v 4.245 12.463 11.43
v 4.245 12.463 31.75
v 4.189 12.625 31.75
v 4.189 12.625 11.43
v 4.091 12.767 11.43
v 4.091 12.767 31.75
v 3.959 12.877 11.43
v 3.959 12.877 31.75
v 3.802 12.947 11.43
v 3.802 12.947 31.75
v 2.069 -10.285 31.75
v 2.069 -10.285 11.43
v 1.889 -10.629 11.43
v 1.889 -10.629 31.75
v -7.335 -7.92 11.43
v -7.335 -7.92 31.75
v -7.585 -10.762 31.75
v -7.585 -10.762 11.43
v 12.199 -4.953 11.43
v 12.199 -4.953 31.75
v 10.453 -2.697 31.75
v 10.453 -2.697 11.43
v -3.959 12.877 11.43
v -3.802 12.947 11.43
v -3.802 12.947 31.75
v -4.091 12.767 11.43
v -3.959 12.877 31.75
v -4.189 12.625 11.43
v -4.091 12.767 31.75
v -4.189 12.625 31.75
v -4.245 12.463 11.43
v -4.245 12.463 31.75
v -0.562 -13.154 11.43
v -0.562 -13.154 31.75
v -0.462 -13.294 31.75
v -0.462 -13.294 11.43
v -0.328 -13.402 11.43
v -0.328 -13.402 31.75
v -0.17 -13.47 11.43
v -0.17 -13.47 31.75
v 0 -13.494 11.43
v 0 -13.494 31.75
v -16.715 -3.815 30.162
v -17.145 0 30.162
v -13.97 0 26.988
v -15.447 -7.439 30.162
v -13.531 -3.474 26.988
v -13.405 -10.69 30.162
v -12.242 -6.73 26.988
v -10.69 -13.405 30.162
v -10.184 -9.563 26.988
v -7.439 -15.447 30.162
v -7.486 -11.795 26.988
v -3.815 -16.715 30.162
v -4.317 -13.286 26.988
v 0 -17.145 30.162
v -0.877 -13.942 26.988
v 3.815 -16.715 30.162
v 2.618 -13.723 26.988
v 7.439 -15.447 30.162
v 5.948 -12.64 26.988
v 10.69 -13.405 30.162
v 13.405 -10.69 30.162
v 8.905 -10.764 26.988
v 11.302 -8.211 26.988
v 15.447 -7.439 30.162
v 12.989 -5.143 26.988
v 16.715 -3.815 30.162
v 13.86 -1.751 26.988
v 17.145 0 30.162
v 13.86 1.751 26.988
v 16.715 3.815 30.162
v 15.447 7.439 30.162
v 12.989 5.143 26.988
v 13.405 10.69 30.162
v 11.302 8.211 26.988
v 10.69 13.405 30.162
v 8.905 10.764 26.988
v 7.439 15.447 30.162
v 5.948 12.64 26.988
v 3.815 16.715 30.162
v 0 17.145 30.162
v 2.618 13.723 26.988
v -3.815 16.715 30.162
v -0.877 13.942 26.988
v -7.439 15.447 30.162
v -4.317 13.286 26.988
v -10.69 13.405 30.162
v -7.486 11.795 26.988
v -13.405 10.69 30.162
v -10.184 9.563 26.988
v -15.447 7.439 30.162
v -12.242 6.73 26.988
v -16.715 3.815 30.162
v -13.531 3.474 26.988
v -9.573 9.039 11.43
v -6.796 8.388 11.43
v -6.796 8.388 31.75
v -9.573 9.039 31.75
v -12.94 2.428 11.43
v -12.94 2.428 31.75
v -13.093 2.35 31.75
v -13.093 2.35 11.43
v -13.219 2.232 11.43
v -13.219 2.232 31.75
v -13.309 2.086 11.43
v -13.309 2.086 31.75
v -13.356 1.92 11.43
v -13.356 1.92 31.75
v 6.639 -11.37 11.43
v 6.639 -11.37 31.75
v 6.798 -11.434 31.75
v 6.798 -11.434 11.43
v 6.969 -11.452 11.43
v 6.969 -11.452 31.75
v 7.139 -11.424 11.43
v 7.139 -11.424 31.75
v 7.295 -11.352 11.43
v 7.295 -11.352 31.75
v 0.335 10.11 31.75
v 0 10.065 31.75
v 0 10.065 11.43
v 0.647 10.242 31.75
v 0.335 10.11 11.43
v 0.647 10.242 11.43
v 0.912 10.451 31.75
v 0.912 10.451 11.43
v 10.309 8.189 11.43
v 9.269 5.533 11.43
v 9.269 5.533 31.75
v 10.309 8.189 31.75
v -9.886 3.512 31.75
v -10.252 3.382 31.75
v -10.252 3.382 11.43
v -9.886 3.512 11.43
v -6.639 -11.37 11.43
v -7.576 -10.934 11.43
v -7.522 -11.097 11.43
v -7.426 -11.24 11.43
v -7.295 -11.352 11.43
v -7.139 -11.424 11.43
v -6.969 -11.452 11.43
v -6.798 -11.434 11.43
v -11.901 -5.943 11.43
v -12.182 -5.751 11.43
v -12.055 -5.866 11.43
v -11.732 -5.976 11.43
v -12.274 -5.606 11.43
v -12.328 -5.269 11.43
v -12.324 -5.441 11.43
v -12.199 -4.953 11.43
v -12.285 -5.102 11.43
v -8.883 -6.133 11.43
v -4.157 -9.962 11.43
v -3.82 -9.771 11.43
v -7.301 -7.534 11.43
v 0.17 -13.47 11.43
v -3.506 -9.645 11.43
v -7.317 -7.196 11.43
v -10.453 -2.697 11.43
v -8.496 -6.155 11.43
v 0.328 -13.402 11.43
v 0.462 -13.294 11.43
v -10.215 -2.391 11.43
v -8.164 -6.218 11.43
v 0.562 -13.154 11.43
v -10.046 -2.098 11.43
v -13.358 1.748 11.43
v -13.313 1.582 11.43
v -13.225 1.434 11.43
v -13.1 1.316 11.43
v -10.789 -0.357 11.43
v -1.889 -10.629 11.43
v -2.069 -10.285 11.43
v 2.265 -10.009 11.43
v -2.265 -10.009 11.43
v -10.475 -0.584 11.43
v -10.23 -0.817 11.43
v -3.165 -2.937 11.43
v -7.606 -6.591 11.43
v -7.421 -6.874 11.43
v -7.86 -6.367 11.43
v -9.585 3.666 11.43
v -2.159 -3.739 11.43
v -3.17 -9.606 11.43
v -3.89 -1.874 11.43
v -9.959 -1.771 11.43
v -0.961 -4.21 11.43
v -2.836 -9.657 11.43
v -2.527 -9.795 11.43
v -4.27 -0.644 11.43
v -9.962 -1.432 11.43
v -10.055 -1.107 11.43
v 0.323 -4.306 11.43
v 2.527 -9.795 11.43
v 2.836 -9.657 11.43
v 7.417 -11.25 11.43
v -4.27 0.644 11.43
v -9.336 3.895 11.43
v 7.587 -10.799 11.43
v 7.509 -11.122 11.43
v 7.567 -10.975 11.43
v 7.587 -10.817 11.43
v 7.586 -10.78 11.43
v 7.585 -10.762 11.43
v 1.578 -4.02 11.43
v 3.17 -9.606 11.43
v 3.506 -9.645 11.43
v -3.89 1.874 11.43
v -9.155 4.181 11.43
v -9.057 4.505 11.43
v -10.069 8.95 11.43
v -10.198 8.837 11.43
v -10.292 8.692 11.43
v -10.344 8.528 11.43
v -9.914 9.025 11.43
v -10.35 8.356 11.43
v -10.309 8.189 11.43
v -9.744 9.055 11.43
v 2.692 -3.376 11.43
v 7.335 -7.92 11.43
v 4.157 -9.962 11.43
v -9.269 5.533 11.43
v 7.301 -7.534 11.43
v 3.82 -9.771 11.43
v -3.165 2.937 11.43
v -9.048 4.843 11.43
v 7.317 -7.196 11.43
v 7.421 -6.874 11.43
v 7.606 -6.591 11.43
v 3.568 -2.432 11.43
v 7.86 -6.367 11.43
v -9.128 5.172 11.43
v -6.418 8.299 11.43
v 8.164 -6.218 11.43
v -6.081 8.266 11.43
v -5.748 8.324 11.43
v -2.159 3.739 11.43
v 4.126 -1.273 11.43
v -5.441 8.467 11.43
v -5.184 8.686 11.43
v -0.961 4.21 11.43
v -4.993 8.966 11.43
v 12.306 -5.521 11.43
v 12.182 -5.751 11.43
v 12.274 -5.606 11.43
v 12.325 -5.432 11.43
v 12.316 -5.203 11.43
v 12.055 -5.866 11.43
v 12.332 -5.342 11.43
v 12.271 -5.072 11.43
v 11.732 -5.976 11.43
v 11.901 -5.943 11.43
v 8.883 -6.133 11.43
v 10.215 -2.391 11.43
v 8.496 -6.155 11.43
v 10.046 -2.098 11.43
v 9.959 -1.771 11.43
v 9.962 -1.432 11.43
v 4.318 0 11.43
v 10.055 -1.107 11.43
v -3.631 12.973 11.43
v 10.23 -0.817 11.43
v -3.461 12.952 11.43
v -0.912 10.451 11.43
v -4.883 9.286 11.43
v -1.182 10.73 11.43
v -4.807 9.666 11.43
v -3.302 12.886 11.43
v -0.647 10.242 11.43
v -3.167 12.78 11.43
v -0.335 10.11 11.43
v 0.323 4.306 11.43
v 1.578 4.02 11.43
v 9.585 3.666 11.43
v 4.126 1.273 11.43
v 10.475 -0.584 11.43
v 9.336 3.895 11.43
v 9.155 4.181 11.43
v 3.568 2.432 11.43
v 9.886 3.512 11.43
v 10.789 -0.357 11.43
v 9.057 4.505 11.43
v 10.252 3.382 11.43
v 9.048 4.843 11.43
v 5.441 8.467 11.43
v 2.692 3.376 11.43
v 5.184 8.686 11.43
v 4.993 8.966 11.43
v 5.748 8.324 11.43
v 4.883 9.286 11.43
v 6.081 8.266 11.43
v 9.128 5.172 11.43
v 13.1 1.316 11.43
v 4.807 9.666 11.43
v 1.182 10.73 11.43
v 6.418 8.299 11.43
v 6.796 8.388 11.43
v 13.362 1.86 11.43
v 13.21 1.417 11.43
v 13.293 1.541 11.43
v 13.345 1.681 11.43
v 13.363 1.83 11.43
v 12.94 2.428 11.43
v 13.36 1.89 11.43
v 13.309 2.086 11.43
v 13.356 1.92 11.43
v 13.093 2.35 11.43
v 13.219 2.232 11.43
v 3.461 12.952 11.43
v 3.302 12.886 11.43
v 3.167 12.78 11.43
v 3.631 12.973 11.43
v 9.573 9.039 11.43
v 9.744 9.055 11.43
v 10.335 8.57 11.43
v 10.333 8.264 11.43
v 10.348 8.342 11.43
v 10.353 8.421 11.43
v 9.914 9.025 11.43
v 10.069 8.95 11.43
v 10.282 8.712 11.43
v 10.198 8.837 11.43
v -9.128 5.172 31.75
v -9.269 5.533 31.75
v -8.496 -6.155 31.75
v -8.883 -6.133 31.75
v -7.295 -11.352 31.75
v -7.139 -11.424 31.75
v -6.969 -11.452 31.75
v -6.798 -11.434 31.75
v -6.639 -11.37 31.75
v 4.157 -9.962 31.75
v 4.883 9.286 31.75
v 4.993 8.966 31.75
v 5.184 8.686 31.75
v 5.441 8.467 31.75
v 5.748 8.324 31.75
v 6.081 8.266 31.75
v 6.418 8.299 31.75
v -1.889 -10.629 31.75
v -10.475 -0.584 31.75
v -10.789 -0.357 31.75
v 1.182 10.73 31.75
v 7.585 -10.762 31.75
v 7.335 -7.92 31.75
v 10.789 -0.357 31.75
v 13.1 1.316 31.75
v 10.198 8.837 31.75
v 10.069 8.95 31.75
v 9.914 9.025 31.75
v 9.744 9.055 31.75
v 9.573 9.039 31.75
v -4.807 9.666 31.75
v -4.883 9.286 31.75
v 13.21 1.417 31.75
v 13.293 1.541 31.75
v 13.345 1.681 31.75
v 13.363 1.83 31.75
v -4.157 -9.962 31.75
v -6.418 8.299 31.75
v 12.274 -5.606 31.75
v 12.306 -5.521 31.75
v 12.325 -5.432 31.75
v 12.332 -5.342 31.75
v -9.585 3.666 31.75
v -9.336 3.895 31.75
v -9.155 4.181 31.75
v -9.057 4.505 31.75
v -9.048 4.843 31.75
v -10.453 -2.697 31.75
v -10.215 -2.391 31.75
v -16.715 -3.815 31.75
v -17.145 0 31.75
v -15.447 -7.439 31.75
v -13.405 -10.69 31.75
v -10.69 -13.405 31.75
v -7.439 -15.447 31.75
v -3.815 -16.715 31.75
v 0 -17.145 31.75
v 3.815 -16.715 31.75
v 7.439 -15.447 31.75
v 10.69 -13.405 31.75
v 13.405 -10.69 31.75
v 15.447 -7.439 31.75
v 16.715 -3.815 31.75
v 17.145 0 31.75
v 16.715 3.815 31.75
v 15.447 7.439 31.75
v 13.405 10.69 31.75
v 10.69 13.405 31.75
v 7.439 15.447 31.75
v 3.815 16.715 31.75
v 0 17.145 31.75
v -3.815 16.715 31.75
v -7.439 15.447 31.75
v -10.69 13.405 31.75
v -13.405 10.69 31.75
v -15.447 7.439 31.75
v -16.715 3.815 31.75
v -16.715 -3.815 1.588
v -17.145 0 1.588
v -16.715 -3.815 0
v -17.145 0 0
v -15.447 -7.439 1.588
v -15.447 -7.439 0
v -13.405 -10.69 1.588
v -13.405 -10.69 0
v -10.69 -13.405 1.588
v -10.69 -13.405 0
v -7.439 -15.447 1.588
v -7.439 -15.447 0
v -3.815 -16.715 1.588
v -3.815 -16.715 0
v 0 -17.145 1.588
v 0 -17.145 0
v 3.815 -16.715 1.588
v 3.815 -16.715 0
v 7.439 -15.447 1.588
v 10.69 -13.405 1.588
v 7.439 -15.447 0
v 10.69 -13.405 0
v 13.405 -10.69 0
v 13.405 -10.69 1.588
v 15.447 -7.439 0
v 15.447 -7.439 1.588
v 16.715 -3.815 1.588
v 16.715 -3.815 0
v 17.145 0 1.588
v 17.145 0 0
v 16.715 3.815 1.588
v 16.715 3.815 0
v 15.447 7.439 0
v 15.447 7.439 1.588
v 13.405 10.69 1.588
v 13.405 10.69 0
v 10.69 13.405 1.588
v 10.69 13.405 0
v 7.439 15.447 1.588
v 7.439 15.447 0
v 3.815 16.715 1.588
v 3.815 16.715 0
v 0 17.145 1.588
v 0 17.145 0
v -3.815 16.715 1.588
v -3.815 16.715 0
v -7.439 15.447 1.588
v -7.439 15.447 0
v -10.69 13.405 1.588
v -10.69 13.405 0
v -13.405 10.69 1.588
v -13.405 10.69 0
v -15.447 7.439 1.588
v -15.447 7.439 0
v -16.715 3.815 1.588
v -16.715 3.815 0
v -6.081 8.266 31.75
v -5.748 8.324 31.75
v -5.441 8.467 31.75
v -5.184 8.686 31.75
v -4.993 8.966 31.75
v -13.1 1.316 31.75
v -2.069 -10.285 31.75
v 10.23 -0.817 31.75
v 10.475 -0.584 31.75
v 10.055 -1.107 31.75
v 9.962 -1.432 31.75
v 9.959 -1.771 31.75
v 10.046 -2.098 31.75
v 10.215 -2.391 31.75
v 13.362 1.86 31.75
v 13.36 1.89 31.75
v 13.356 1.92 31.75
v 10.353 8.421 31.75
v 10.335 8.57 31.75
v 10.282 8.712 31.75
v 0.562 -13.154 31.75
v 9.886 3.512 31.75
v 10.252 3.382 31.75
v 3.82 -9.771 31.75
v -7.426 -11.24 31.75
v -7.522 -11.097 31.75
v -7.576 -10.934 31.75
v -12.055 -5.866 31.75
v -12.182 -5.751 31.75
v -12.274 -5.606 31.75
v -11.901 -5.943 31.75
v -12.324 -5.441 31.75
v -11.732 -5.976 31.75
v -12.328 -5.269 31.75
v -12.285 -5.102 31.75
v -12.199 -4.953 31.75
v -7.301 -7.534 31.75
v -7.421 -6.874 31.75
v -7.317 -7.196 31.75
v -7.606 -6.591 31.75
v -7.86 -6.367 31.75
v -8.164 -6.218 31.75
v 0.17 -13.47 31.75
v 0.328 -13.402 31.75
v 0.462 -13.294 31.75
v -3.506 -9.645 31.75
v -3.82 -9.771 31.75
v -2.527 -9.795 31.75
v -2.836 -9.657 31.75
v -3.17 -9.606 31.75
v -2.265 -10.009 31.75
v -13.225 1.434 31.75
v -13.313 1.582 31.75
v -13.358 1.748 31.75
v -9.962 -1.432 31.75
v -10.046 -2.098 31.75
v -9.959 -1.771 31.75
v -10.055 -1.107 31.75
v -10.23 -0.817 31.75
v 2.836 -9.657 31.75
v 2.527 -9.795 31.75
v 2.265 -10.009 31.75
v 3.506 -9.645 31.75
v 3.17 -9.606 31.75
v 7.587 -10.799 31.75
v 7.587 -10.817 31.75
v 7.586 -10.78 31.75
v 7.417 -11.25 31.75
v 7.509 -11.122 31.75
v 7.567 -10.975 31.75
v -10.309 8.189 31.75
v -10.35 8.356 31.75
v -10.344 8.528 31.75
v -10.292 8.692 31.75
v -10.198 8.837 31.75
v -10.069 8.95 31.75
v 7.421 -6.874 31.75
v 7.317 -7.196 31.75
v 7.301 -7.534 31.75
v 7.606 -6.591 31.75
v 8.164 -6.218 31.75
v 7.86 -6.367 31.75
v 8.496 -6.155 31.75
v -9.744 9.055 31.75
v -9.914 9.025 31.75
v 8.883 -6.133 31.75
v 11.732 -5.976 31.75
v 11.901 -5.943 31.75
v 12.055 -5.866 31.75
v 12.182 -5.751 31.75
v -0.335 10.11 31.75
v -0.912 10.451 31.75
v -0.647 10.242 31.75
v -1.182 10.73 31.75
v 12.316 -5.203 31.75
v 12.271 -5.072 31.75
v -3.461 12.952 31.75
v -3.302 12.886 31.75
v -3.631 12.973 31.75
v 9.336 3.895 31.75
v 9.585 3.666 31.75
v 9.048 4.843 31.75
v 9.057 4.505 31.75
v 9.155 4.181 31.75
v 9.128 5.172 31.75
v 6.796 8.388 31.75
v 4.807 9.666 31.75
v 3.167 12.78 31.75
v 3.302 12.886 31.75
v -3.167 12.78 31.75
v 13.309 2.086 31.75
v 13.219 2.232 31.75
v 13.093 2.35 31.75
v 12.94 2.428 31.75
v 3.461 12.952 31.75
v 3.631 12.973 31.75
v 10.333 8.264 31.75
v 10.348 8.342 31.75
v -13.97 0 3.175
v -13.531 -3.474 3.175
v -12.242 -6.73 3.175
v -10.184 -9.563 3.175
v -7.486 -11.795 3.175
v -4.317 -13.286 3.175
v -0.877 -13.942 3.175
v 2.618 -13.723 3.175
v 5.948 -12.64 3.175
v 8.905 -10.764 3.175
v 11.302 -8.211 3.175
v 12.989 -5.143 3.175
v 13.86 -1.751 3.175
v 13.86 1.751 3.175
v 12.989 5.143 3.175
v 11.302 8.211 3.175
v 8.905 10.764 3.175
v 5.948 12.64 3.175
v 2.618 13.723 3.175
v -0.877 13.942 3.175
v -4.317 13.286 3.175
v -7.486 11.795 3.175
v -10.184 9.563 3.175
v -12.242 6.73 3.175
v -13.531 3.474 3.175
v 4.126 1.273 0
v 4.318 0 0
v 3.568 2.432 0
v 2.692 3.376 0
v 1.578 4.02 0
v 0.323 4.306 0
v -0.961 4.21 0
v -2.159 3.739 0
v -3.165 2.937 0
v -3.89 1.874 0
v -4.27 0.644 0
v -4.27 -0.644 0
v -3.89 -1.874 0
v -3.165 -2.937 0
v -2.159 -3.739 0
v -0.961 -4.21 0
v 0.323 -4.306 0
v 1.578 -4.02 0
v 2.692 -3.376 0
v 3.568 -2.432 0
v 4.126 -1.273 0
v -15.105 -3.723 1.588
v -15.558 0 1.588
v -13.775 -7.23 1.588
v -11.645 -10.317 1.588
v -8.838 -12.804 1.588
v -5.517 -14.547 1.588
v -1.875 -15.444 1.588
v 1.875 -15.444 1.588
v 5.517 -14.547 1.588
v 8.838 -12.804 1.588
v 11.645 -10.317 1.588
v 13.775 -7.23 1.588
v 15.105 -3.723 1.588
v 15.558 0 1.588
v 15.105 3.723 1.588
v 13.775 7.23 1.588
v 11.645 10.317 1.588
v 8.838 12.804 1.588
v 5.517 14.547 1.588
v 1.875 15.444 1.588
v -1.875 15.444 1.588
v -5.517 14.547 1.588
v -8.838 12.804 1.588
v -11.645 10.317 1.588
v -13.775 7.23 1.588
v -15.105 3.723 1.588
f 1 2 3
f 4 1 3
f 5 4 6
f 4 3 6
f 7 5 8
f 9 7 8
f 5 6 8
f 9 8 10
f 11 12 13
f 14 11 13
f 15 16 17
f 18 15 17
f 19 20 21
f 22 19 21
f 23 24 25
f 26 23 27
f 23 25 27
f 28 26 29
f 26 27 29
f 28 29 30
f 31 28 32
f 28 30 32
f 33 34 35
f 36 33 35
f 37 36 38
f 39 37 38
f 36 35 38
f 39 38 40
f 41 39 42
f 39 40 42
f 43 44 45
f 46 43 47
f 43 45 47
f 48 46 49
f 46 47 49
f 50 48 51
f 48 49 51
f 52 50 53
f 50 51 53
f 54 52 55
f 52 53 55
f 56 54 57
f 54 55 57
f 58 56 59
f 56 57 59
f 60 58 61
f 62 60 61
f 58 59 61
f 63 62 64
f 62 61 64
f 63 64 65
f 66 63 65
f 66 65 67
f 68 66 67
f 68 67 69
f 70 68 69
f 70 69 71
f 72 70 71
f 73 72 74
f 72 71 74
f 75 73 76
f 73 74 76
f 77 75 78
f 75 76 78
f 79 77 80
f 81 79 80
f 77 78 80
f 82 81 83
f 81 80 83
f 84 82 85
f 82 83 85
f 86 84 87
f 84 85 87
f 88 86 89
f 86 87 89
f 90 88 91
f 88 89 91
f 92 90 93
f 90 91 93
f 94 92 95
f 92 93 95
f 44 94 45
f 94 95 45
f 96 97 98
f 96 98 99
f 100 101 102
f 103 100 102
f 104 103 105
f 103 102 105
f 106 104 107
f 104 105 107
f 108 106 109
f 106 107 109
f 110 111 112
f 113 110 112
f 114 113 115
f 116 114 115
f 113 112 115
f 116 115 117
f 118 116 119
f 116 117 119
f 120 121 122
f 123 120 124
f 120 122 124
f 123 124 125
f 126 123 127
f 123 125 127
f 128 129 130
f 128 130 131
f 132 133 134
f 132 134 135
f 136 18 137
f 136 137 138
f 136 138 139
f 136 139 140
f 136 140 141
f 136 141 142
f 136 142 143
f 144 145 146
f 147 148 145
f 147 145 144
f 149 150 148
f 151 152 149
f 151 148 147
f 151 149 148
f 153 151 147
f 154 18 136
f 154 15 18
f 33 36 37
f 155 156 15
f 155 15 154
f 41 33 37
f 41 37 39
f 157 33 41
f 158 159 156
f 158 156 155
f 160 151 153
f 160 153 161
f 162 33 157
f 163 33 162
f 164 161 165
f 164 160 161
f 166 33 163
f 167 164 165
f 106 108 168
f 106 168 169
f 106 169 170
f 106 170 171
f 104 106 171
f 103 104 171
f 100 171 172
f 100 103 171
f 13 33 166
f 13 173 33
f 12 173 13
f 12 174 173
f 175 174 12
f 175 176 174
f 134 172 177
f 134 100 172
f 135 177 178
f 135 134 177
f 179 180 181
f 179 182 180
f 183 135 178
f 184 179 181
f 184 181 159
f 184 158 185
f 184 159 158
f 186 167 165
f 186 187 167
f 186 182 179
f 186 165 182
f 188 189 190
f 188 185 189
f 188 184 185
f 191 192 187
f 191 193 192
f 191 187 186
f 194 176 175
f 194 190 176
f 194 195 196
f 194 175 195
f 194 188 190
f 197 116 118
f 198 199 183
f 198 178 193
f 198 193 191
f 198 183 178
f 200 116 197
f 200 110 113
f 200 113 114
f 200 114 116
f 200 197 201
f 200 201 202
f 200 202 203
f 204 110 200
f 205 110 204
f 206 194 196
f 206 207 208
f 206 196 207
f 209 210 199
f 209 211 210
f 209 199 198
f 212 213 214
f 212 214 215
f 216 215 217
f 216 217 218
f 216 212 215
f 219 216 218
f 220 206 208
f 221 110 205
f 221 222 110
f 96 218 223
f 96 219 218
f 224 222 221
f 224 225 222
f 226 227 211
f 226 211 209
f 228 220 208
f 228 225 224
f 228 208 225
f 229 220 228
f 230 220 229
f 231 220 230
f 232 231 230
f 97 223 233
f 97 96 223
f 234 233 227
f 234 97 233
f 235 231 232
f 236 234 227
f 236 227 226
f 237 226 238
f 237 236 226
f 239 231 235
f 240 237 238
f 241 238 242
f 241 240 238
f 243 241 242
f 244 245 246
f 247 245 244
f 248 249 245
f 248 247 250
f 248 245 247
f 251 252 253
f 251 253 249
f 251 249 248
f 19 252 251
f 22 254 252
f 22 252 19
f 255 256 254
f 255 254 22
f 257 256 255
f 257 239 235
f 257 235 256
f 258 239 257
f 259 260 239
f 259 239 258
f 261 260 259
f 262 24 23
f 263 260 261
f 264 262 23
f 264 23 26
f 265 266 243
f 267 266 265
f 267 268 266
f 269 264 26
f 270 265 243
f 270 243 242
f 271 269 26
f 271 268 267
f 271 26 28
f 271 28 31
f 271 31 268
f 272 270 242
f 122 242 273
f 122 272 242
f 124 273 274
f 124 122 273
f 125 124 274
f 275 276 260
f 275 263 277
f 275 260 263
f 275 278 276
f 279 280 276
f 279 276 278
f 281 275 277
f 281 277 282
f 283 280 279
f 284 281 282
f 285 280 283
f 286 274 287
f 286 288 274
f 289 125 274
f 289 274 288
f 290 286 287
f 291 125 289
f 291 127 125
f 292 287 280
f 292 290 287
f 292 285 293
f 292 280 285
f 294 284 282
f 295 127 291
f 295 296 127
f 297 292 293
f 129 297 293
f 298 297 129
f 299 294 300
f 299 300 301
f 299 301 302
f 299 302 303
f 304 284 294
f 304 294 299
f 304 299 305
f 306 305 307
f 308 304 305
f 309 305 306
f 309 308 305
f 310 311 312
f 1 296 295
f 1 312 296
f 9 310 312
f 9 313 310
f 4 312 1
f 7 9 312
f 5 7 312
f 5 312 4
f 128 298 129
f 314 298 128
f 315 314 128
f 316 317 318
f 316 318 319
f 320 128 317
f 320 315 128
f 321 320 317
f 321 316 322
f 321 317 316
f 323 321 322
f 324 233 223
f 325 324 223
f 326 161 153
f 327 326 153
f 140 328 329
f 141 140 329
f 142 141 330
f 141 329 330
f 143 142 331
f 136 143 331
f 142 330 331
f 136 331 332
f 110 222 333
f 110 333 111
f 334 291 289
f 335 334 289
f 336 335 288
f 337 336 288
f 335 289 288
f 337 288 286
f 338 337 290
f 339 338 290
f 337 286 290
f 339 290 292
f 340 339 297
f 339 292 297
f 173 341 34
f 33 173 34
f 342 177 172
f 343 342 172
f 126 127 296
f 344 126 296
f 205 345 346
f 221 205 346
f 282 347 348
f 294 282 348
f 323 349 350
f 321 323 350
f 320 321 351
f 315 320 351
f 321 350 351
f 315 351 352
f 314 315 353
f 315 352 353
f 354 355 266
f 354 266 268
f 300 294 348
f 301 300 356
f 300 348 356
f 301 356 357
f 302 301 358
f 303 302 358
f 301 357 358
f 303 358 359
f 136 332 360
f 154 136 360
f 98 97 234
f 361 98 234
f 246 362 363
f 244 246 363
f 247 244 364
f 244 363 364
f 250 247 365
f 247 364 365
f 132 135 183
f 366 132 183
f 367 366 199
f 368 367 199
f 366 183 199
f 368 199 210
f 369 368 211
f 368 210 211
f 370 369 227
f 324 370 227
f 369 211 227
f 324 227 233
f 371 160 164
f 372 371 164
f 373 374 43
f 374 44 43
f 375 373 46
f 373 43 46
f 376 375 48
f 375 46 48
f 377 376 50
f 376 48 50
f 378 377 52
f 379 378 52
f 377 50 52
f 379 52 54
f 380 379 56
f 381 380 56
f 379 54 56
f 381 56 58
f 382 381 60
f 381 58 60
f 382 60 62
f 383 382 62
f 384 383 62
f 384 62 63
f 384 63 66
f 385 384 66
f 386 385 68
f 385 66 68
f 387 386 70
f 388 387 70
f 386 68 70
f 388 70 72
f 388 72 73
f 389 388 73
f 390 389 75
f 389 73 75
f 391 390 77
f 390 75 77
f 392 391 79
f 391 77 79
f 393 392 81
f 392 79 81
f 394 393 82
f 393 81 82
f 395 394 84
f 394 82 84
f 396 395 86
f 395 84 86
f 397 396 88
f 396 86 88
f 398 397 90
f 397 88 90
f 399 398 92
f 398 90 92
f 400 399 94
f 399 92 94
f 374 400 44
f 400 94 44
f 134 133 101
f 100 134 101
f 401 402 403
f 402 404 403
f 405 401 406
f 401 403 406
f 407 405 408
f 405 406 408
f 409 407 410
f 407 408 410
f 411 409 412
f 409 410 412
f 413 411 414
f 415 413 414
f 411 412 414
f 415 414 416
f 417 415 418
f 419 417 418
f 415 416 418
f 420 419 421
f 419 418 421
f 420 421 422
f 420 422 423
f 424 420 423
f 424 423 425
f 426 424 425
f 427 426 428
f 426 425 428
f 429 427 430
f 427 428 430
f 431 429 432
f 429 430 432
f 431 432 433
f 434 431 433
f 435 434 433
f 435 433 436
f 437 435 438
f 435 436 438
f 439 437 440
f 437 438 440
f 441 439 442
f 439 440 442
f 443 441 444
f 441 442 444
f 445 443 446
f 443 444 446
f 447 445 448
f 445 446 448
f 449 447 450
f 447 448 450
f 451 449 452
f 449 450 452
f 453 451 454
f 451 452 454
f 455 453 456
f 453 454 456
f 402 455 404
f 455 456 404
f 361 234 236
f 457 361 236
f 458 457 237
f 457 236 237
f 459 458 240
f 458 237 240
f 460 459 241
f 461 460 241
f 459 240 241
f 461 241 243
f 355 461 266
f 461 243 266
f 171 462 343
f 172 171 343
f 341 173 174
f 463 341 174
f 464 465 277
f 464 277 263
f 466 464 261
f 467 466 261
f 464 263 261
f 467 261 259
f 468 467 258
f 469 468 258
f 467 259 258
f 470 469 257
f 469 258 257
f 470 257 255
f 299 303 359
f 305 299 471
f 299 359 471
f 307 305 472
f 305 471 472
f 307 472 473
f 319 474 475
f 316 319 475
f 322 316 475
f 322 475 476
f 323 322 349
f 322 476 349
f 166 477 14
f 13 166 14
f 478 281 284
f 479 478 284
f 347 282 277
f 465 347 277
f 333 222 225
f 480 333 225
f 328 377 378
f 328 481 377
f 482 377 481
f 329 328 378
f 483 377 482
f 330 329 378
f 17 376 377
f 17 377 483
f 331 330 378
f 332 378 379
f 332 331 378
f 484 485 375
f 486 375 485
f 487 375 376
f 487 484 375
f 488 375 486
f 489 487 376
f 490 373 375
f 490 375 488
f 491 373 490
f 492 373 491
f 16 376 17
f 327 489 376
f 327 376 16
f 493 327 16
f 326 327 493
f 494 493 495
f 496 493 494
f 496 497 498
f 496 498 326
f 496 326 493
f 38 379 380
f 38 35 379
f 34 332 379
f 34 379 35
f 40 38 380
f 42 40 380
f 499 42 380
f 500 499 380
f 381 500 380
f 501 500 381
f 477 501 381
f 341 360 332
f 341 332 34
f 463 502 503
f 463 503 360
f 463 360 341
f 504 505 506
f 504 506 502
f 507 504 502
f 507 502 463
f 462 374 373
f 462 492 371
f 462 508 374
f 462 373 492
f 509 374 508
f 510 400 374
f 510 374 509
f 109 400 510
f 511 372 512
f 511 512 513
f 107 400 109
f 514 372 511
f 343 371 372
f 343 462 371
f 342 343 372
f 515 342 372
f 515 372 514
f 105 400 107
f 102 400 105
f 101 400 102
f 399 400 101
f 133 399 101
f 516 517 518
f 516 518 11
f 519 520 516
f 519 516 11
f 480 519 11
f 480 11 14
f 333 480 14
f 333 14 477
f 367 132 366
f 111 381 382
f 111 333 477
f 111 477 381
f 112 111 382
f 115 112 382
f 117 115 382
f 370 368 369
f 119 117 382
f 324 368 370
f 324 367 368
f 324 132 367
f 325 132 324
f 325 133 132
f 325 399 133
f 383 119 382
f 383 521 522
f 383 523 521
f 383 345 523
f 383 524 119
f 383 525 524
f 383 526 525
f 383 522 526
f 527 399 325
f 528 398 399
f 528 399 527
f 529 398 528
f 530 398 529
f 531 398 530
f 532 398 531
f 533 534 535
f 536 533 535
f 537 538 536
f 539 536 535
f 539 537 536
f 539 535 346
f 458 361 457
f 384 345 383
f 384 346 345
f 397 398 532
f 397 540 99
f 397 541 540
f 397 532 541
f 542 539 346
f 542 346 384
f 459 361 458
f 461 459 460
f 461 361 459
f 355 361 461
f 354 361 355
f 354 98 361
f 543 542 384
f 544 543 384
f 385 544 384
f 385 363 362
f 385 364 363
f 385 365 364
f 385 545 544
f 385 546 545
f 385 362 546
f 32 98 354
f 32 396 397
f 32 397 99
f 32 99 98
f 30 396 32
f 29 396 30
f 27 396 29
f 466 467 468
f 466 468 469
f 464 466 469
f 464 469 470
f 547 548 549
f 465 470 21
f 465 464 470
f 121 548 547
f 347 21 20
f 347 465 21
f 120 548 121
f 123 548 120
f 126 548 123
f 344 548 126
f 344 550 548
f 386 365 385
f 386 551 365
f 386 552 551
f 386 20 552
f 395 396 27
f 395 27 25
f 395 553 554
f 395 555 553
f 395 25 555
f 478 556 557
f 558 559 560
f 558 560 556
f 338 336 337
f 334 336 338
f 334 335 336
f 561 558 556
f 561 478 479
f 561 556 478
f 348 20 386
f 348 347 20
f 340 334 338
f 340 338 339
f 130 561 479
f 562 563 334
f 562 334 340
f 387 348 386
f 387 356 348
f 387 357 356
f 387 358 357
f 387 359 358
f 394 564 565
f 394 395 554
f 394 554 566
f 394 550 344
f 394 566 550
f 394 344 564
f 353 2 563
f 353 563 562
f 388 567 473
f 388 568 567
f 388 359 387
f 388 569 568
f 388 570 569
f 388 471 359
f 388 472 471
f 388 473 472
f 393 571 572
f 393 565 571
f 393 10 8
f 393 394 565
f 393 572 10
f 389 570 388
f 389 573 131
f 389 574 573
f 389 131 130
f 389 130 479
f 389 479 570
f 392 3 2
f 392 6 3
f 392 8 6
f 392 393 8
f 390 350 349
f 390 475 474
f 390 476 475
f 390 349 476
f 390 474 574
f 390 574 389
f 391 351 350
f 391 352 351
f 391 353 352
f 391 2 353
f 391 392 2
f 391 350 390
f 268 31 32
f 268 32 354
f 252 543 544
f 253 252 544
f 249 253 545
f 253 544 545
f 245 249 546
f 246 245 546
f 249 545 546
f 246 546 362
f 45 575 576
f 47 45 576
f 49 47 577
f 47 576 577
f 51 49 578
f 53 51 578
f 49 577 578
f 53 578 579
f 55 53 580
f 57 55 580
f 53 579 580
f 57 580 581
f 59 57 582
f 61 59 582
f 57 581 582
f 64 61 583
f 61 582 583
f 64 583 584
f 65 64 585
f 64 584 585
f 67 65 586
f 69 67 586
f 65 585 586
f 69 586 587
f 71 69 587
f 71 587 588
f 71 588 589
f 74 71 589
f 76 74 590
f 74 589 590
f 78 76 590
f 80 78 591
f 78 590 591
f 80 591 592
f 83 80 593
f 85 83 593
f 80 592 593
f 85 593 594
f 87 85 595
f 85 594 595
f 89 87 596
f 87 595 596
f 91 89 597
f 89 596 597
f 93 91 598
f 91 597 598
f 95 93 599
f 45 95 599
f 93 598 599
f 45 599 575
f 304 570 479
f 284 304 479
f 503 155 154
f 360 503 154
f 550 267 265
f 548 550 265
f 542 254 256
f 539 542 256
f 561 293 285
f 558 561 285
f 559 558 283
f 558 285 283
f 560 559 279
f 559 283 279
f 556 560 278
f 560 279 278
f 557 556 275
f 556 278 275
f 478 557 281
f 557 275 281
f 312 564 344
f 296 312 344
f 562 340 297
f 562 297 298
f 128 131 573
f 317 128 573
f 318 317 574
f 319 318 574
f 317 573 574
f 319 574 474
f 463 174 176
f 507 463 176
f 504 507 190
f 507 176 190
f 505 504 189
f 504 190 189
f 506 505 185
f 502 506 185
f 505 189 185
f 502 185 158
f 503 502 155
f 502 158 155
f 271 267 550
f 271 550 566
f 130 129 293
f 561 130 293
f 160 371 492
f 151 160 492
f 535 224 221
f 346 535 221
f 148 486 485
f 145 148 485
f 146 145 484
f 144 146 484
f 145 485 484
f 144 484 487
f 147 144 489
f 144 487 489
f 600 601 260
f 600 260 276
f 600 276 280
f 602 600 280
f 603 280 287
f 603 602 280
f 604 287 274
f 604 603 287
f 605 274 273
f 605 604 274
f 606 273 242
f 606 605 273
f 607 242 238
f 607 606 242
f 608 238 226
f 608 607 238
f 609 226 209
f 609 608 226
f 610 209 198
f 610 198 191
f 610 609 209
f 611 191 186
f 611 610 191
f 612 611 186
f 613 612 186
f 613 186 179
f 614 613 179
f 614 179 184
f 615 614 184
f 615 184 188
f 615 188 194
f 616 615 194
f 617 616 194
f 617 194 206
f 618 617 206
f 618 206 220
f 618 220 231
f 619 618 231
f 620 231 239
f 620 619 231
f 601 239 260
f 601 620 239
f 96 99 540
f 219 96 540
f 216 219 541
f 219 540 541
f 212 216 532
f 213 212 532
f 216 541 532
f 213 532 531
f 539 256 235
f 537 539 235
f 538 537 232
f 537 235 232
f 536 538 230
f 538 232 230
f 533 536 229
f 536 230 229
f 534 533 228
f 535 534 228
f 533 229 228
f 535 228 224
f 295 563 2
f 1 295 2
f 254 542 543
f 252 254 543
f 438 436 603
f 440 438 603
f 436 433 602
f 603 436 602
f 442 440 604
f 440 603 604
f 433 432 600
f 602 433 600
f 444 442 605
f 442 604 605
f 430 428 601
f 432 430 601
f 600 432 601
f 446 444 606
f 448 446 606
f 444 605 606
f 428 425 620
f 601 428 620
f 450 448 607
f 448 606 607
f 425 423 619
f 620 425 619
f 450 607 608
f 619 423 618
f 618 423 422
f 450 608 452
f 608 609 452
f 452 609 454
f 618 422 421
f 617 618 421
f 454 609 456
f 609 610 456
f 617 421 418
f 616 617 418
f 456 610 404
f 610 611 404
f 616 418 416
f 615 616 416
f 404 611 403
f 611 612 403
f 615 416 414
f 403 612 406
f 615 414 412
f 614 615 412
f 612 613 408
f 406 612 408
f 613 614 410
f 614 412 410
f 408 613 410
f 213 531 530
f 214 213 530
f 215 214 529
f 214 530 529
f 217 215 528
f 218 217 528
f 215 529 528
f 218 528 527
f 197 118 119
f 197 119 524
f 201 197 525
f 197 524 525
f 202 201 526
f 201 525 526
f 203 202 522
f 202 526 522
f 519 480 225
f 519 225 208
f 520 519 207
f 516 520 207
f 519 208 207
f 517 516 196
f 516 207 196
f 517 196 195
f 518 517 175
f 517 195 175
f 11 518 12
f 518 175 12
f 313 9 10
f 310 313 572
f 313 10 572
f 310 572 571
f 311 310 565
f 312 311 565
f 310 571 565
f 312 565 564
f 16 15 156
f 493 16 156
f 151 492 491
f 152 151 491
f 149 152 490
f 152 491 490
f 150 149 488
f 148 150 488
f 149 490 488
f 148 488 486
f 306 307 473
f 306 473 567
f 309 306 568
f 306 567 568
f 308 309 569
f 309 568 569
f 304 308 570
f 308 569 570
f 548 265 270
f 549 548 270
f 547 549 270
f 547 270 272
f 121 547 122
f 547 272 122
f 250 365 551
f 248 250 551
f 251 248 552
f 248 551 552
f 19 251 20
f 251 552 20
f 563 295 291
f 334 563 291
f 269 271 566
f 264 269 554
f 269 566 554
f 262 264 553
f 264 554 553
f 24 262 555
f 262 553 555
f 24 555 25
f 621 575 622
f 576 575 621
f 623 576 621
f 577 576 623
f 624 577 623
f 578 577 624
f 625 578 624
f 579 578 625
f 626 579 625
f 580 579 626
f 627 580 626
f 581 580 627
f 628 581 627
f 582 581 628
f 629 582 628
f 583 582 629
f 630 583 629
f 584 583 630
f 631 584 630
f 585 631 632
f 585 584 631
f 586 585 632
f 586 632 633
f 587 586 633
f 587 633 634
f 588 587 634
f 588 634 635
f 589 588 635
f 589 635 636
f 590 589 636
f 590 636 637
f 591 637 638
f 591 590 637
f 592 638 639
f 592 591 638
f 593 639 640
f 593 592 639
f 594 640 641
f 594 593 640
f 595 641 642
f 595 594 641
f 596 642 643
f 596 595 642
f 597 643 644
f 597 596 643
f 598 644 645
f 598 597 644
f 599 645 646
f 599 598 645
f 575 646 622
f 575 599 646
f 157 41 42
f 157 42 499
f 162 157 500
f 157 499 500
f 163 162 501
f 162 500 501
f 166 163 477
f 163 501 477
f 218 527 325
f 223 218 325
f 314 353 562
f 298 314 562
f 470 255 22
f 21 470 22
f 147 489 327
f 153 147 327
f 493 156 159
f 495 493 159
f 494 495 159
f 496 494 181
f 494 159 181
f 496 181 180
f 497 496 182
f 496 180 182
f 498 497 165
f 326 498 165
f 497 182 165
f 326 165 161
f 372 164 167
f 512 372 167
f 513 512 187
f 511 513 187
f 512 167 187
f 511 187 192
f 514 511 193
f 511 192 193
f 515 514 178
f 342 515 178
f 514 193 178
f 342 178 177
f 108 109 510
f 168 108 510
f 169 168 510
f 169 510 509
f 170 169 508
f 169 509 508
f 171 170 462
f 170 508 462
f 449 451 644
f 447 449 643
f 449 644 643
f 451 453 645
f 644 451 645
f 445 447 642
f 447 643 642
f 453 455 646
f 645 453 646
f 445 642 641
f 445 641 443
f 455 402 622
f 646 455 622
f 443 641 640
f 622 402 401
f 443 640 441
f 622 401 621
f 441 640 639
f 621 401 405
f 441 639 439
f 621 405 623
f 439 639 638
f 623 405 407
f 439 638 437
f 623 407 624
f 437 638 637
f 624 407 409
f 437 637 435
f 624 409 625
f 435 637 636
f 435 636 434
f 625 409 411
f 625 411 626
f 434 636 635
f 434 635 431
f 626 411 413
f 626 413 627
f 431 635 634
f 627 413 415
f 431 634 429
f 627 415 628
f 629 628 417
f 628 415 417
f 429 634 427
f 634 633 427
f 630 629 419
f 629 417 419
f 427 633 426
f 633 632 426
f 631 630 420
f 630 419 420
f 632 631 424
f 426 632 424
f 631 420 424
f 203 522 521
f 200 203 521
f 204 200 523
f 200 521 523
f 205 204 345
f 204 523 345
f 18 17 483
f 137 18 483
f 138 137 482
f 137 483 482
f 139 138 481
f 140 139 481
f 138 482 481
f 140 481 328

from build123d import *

# Parameters (mm, degrees)
F0_R     = 12.7
F0_R_2   = 4.318
F1_DEPTH = 11.43
F5_SIZE  = 1.5875
F7_DEPTH = 20.32
F8_DEPTH = 20.32


with BuildPart() as f1:
    # F0 (on Top) → F1 (new body)
    with BuildSketch(Plane.XY):
        Circle(F0_R)
        Circle(F0_R_2, mode=Mode.SUBTRACT)
    extrude(amount=F1_DEPTH)

    # F2 (on Front) → F3 (revolve)
    with BuildSketch(Plane.XZ):
        Polygon((-17.145, 0), (-7.62, 0), (-7.62, 1.5875), (-10.795, 1.5875), (-10.795, 31.75), (-17.145, 31.75), (-17.145, 30.1625), (-13.97, 30.1625), (-13.97, 26.9875), (-13.97, 1.5875), (-17.145, 1.5875), align=None)
        Polygon((-17.145, 30.1625), (-13.97, 26.9875), (-13.97, 30.1625), align=None)
    revolve(axis=Axis((0, 0, 11.5776285529), (0, 0, 1)))

    # F5
    f5_edges = [f1.edges().sort_by_distance(p)[0] for p in [
        (13.97, 0, 1.5875),
    ]]
    chamfer(f5_edges, length=F5_SIZE)

    # F6 (on face) → F7 (cut, through all)
    with BuildSketch(Plane.XY.offset(31.75)):
        with BuildLine():
            Line((-10.4525954137, -2.6972716061), (-12.1988524903, -4.9530041056))
            ThreePointArc((-12.1988524903, -4.9530041056), (-11.4913314283, -4.7408549365), (-11.0617303864, -5.3417178727))
            ThreePointArc((-11.0617303864, -5.3417178727), (-11.2602854276, -5.8029562036), (-11.7317801436, -5.9757498234))
            Line((-11.7317801436, -5.9757498234), (-8.8834561601, -6.1332072892))
            ThreePointArc((-8.8834561601, -6.1332072892), (-9.8194773853, -4.4844050753), (-10.4525954137, -2.6972716061))
        make_face()
        with BuildLine():
            ThreePointArc((-12.1988524903, -4.9530041056), (-12.3275224072, -5.2687355018), (-12.2743467257, -5.605506357))
            ThreePointArc((-12.2743467257, -5.605506357), (-12.0546549491, -5.8662319406), (-11.7317801436, -5.9757498234))
            ThreePointArc((-11.7317801436, -5.9757498234), (-11.2602854276, -5.8029562036), (-11.0617303864, -5.3417178727))
            ThreePointArc((-11.0617303864, -5.3417178727), (-11.4913314283, -4.7408549365), (-12.1988524903, -4.9530041056))
        make_face()
        with BuildLine():
            Line((-10.2515379451, 3.3820104613), (-12.9401239425, 2.4284653804))
            ThreePointArc((-12.9401239425, 2.4284653804), (-12.361504969, 2.3486470375), (-12.0928664774, 1.8299908459))
            ThreePointArc((-12.0928664774, 1.8299908459), (-12.4390464603, 1.264475154), (-13.1001357616, 1.3155585568))
            Line((-13.1001357616, 1.3155585568), (-10.7891010809, -0.3568232994))
            ThreePointArc((-10.7891010809, -0.3568232994), (-10.6851224667, 1.5362886683), (-10.2515379451, 3.3820104613))
        make_face()
        with BuildLine():
            ThreePointArc((-12.9401239425, 2.4284653804), (-13.2190652412, 2.2324194413), (-13.3564030838, 1.9203608324))
            ThreePointArc((-13.3564030838, 1.9203608324), (-13.3125454969, 1.5822501665), (-13.1001357616, 1.3155585568))
            ThreePointArc((-13.1001357616, 1.3155585568), (-12.4390464603, 1.264475154), (-12.0928664774, 1.8299908459))
            ThreePointArc((-12.0928664774, 1.8299908459), (-12.361504969, 2.3486470375), (-12.9401239425, 2.4284653804))
        make_face()
        with BuildLine():
            Line((-6.7956896128, 8.3875281035), (-9.5729974735, 9.0389142669))
            ThreePointArc((-9.5729974735, 9.0389142669), (-9.2203512646, 8.8151214081), (-9.0829948927, 8.4206904009))
            ThreePointArc((-9.0829948927, 8.4206904009), (-9.6001982975, 7.7967120663), (-10.3092908365, 8.1891863905))
            Line((-10.3092908365, 8.1891863905), (-9.2692826406, 5.5328495668))
            ThreePointArc((-9.2692826406, 5.5328495668), (-8.1583166623, 7.0692216147), (-6.7956896128, 8.3875281035))
        make_face()
        with BuildLine():
            ThreePointArc((-9.5729974735, 9.0389142669), (-9.9136482865, 9.0247969722), (-10.1978958619, 8.8365269791))
            ThreePointArc((-10.1978958619, 8.8365269791), (-10.3437969109, 8.5283789982), (-10.3092908365, 8.1891863905))
            ThreePointArc((-10.3092908365, 8.1891863905), (-9.6001982975, 7.7967120663), (-9.0829948927, 8.4206904009))
            ThreePointArc((-9.0829948927, 8.4206904009), (-9.2203512646, 8.8151214081), (-9.5729974735, 9.0389142669))
        make_face()
        with BuildLine():
            Line((-1.1822578445, 10.7300648362), (-3.1665119462, 12.7795717395))
            ThreePointArc((-3.1665119462, 12.7795717395), (-3.0341189729, 12.5761316197), (-2.9877285936, 12.3378802515))
            ThreePointArc((-2.9877285936, 12.3378802515), (-3.6854985998, 11.7059902877), (-4.2453189127, 12.4628054073))
            Line((-4.2453189127, 12.4628054073), (-4.8065324556, 9.6658817887))
            ThreePointArc((-4.8065324556, 9.6658817887), (-3.0413029616, 10.3577266471), (-1.1822578445, 10.7300648362))
        make_face()
        with BuildLine():
            ThreePointArc((-3.1665119462, 12.7795717395), (-3.4607180661, 12.9518652586), (-3.8016288198, 12.9471582743))
            ThreePointArc((-3.8016288198, 12.9471582743), (-4.090965925, 12.7668077529), (-4.2453189127, 12.4628054073))
            ThreePointArc((-4.2453189127, 12.4628054073), (-3.6854985998, 11.7059902877), (-2.9877285936, 12.3378802515))
            ThreePointArc((-2.9877285936, 12.3378802515), (-3.0341189729, 12.5761316197), (-3.1665119462, 12.7795717395))
        make_face()
        with BuildLine():
            Line((3.0413028854, 10.3577266695), (3.4438282673, 11.7286022581))
            ThreePointArc((3.4438282673, 11.7286022581), (3.008743441, 12.1758697278), (3.1665117699, 12.7795717652))
            Line((3.1665117699, 12.7795717652), (1.1822578227, 10.7300648386))
            ThreePointArc((1.1822578227, 10.7300648386), (2.1199705639, 10.5847886048), (3.0413028854, 10.3577266695))
        make_face()
        with BuildLine():
            ThreePointArc((4.2453187505, 12.462805481), (4.0909657389, 12.766807831), (3.8016286067, 12.9471583368))
            Line((3.8016286067, 12.9471583368), (3.4438282673, 11.7286022581))
            ThreePointArc((3.4438282673, 11.7286022581), (4.0032697568, 11.8295366107), (4.257728437, 12.3378802975))
            ThreePointArc((4.257728437, 12.3378802975), (4.2546183994, 12.4006503178), (4.2453187505, 12.462805481))
        make_face()
        with BuildLine():
            ThreePointArc((4.257728437, 12.3378802975), (4.0032697568, 11.8295366107), (3.4438282673, 11.7286022581))
            Line((3.4438282673, 11.7286022581), (3.0413028854, 10.3577266695))
            ThreePointArc((3.0413028854, 10.3577266695), (3.9391359635, 10.0506334557), (4.806532436, 9.6658817985))
            Line((4.806532436, 9.6658817985), (4.2453187505, 12.462805481))
            ThreePointArc((4.2453187505, 12.462805481), (4.2546183994, 12.4006503178), (4.257728437, 12.3378802975))
        make_face()
        with BuildLine():
            Line((3.4438282673, 11.7286022581), (3.8016286067, 12.9471583368))
            ThreePointArc((3.8016286067, 12.9471583368), (3.4607178673, 12.9518652935), (3.1665117699, 12.7795717652))
            ThreePointArc((3.1665117699, 12.7795717652), (3.008743441, 12.1758697278), (3.4438282673, 11.7286022581))
        make_face()
        with BuildLine():
            Line((-7.335027693, -7.9201889967), (-7.5845315655, -10.7619297844))
            ThreePointArc((-7.5845315655, -10.7619297844), (-6.924168837, -10.1830775705), (-6.3169650428, -10.8174689094))
            ThreePointArc((-6.3169650428, -10.8174689094), (-6.4032533172, -11.1370630929), (-6.6386672228, -11.3697998573))
            Line((-6.6386672228, -11.3697998573), (-4.157376676, -9.9623412998))
            ThreePointArc((-4.157376676, -9.9623412998), (-5.8362176152, -9.0813318928), (-7.335027693, -7.9201889967))
        make_face()
        with BuildLine():
            ThreePointArc((-7.5845315655, -10.7619297844), (-7.52207831, -11.0971041407), (-7.2952720168, -11.3516648675))
            ThreePointArc((-7.2952720168, -11.3516648675), (-6.969496637, -11.4522268501), (-6.6386672228, -11.3697998573))
            ThreePointArc((-6.6386672228, -11.3697998573), (-6.4032533172, -11.1370630929), (-6.3169650428, -10.8174689094))
            ThreePointArc((-6.3169650428, -10.8174689094), (-6.924168837, -10.1830775705), (-7.5845315655, -10.7619297844))
        make_face()
        with BuildLine():
            Line((-1.8886405066, -10.6285023421), (-0.5621754583, -13.1540187967))
            ThreePointArc((-0.5621754583, -13.1540187967), (-0.1520583482, -12.2422248716), (0.6350000816, -12.85875))
            ThreePointArc((0.6350000816, -12.85875), (0.6165252134, -13.0108084161), (0.5621756347, -13.1540187717))
            Line((0.5621756347, -13.1540187717), (1.8886405281, -10.6285023383))
            ThreePointArc((1.8886405281, -10.6285023383), (1.09e-08, -10.795), (-1.8886405066, -10.6285023421))
        make_face()
        with BuildLine():
            ThreePointArc((-0.5621754583, -13.1540187967), (-0.3284274706, -13.4022206459), (8.16e-08, -13.49375))
            ThreePointArc((8.16e-08, -13.49375), (0.3284276459, -13.4022206386), (0.5621756347, -13.1540187717))
            ThreePointArc((0.5621756347, -13.1540187717), (0.6165252134, -13.0108084161), (0.6350000816, -12.85875))
            ThreePointArc((0.6350000816, -12.85875), (-0.1520583482, -12.2422248716), (-0.5621754583, -13.1540187967))
        make_face()
        with BuildLine():
            Line((4.1573766962, -9.9623412914), (6.6386673847, -11.369799783))
            ThreePointArc((6.6386673847, -11.369799783), (6.6086582491, -10.2832728355), (7.5845317003, -10.7619296679))
            Line((7.5845317003, -10.7619296679), (7.3350277091, -7.9201889818))
            ThreePointArc((7.3350277091, -7.9201889818), (5.8362176336, -9.081331881), (4.1573766962, -9.9623412914))
        make_face()
        with BuildLine():
            ThreePointArc((6.6386673847, -11.369799783), (6.9694967855, -11.4522267615), (7.2952721492, -11.3516647824))
            ThreePointArc((7.2952721492, -11.3516647824), (7.5092913527, -11.1217919017), (7.5869651801, -10.8174688212))
            ThreePointArc((7.5869651801, -10.8174688212), (7.5863565184, -10.7896726012), (7.5845317003, -10.7619296679))
            ThreePointArc((7.5845317003, -10.7619296679), (6.6086582491, -10.2832728355), (6.6386673847, -11.369799783))
        make_face()
        with BuildLine():
            Line((8.8834561725, -6.1332072712), (11.7317802397, -5.9757496733))
            ThreePointArc((11.7317802397, -5.9757496733), (11.1191141312, -5.0779292038), (12.1988525408, -4.9530039347))
            Line((12.1988525408, -4.9530039347), (10.4525954192, -2.6972715849))
            ThreePointArc((10.4525954192, -2.6972715849), (9.8194773944, -4.4844050554), (8.8834561725, -6.1332072712))
        make_face()
        with BuildLine():
            ThreePointArc((11.7317802397, -5.9757496733), (12.0546550169, -5.866231792), (12.2743467819, -5.6055062342))
            ThreePointArc((12.2743467819, -5.6055062342), (12.3172187168, -5.4766966706), (12.3317304542, -5.3417177242))
            ThreePointArc((12.3317304542, -5.3417177242), (12.2975933857, -5.1363187527), (12.1988525408, -4.9530039347))
            ThreePointArc((12.1988525408, -4.9530039347), (11.1191141312, -5.0779292038), (11.7317802397, -5.9757496733))
        make_face()
        with BuildLine():
            ThreePointArc((13.1001357613, 1.315558735), (12.0993298406, 1.7396210711), (12.9401238926, 2.4284655514))
            Line((12.9401238926, 2.4284655514), (10.2515379382, 3.3820104821))
            ThreePointArc((10.2515379382, 3.3820104821), (10.6582685518, 1.7126985953), (10.795, 0))
            ThreePointArc((10.795, 0), (10.7935251696, -0.178436017), (10.7891010816, -0.3568232775))
            Line((10.7891010816, -0.3568232775), (13.1001357613, 1.315558735))
        make_face()
        with BuildLine():
            ThreePointArc((13.3628664542, 1.8299910074), (13.3612485452, 1.8752914129), (13.3564030629, 1.9203609777))
            ThreePointArc((13.3564030629, 1.9203609777), (13.2190652142, 2.2324196075), (12.9401238926, 2.4284655514))
            ThreePointArc((12.9401238926, 2.4284655514), (12.0993298406, 1.7396210711), (13.1001357613, 1.315558735))
            ThreePointArc((13.1001357613, 1.315558735), (13.2933821525, 1.541171003), (13.3628664542, 1.8299910074))
        make_face()
        with BuildLine():
            ThreePointArc((10.3092907399, 8.1891865402), (9.2380938153, 8.0048539475), (9.572997339, 9.0389143838))
            Line((9.572997339, 9.0389143838), (6.7956895958, 8.3875281173))
            ThreePointArc((6.7956895958, 8.3875281173), (8.158316648, 7.0692216312), (9.2692826294, 5.5328495856))
            Line((9.2692826294, 5.5328495856), (10.3092907399, 8.1891865402))
        make_face()
        with BuildLine():
            ThreePointArc((10.3529947858, 8.4206905243), (10.3129578717, 8.6426002501), (10.1978958049, 8.8365270449))
            ThreePointArc((10.1978958049, 8.8365270449), (9.9136482024, 9.0247970882), (9.572997339, 9.0389143838))
            ThreePointArc((9.572997339, 9.0389143838), (9.2380938153, 8.0048539475), (10.3092907399, 8.1891865402))
            ThreePointArc((10.3092907399, 8.1891865402), (10.3419731231, 8.302893943), (10.3529947858, 8.4206905243))
        make_face()
    extrude(amount=-F7_DEPTH, mode=Mode.SUBTRACT)

    # F4 (on face) → F8 (join, through all)
    with BuildSketch(Plane.XY.offset(11.43)):
        with BuildLine():
            Line((9.8859363825, 3.5116762306), (10.2515379382, 3.3820104821))
            ThreePointArc((10.2515379382, 3.3820104821), (9.8194773853, 4.4844050753), (9.2692826294, 5.5328495856))
            Line((9.2692826294, 5.5328495856), (9.1278593511, 5.1716332867))
            ThreePointArc((9.1278593511, 5.1716332867), (9.155218637, 4.1810482264), (9.8859363825, 3.5116762306))
        make_face()
        with BuildLine():
            ThreePointArc((10.4525954192, -2.6972715849), (10.6851224667, -1.5362886683), (10.7891010816, -0.3568232775))
            Line((10.7891010816, -0.3568232775), (10.474839974, -0.5842385682))
            ThreePointArc((10.474839974, -0.5842385682), (9.9623053531, -1.4323632965), (10.2151344151, -2.390530692))
            Line((10.2151344151, -2.390530692), (10.4525954192, -2.6972715849))
        make_face()
        with BuildLine():
            ThreePointArc((7.3350277091, -7.9201889818), (8.1583166623, -7.0692216147), (8.8834561725, -6.1332072712))
            Line((8.8834561725, -6.1332072712), (8.4961329169, -6.1546188058))
            ThreePointArc((8.4961329169, -6.1546188058), (7.6064305099, -6.5910095934), (7.3010994475, -7.5337610106))
            Line((7.3010994475, -7.5337610106), (7.3350277091, -7.9201889818))
        make_face()
        with BuildLine():
            ThreePointArc((1.8886405281, -10.6285023383), (3.0413029616, -10.3577266471), (4.1573766962, -9.9623412914))
            Line((4.1573766962, -9.9623412914), (3.8199636894, -9.770951059))
            ThreePointArc((3.8199636894, -9.770951059), (2.8355677243, -9.6570569142), (2.0690169925, -10.2850754393))
            Line((2.0690169925, -10.2850754393), (1.8886405281, -10.6285023383))
        make_face()
        with BuildLine():
            Line((-3.8199637387, -9.7709510869), (-4.157376676, -9.9623412998))
            ThreePointArc((-4.157376676, -9.9623412998), (-3.0413029406, -10.3577266533), (-1.8886405066, -10.6285023421))
            Line((-1.8886405066, -10.6285023421), (-2.0690170188, -10.2850753892))
            ThreePointArc((-2.0690170188, -10.2850753892), (-2.8355677786, -9.6570568982), (-3.8199637387, -9.7709510869))
        make_face()
        with BuildLine():
            Line((-8.4961329734, -6.1546188027), (-8.8834561601, -6.1332072892))
            ThreePointArc((-8.8834561601, -6.1332072892), (-8.158316648, -7.0692216312), (-7.335027693, -7.9201889967))
            Line((-7.335027693, -7.9201889967), (-7.3010994426, -7.5337609542))
            ThreePointArc((-7.3010994426, -7.5337609542), (-7.606430547, -6.5910095506), (-8.4961329734, -6.1546188027))
        make_face()
        with BuildLine():
            Line((-10.4748400199, -0.584238535), (-10.7891010809, -0.3568232994))
            ThreePointArc((-10.7891010809, -0.3568232994), (-10.6851224635, -1.53628869), (-10.4525954137, -2.6972716061))
            Line((-10.4525954137, -2.6972716061), (-10.2151343804, -2.3905306473))
            ThreePointArc((-10.2151343804, -2.3905306473), (-9.9623053612, -1.4323632405), (-10.4748400199, -0.584238535))
        make_face()
        with BuildLine():
            Line((-9.1278593717, 5.1716333395), (-9.2692826406, 5.5328495668))
            ThreePointArc((-9.2692826406, 5.5328495668), (-9.8194773944, 4.4844050554), (-10.2515379451, 3.3820104613))
            Line((-10.2515379451, 3.3820104613), (-9.8859363292, 3.5116762495))
            ThreePointArc((-9.8859363292, 3.5116762495), (-9.1552186135, 4.1810482779), (-9.1278593717, 5.1716333395))
        make_face()
        with BuildLine():
            Line((-4.8828478674, 9.2855481697), (-4.8065324556, 9.6658817887))
            ThreePointArc((-4.8065324556, 9.6658817887), (-5.8362176336, 9.081331881), (-6.7956896128, 8.3875281035))
            Line((-6.7956896128, 8.3875281035), (-6.4180233441, 8.2989507494))
            ThreePointArc((-6.4180233441, 8.2989507494), (-5.4414146437, 8.4670065099), (-4.8828478674, 9.2855481697))
        make_face()
        with BuildLine():
            Line((0, 10.06475), (0, 10.795))
            ThreePointArc((0, 10.795), (-0.592019887, 10.7787539843), (-1.1822578445, 10.7300648362))
            Line((-1.1822578445, 10.7300648362), (-0.9124332948, 10.4513670239))
            ThreePointArc((-0.9124332948, 10.4513670239), (-0.4954813924, 10.1653919753), (0, 10.06475))
        make_face()
        with BuildLine():
            ThreePointArc((1.1822578227, 10.7300648386), (0.5920198761, 10.7787539849), (0, 10.795))
            Line((0, 10.795), (0, 10.06475))
            ThreePointArc((0, 10.06475), (0.4954814184, 10.1653919864), (0.9124333342, 10.4513670646))
            Line((0.9124333342, 10.4513670646), (1.1822578227, 10.7300648386))
        make_face()
        with BuildLine():
            ThreePointArc((6.7956895958, 8.3875281173), (5.8362176152, 9.0813318928), (4.806532436, 9.6658817985))
            Line((4.806532436, 9.6658817985), (4.8828478786, 9.2855481142))
            ThreePointArc((4.8828478786, 9.2855481142), (5.4414146913, 8.4670064793), (6.4180233992, 8.2989507623))
            Line((6.4180233992, 8.2989507623), (6.7956895958, 8.3875281173))
        make_face()
    extrude(amount=F8_DEPTH)


solid = f1.part
